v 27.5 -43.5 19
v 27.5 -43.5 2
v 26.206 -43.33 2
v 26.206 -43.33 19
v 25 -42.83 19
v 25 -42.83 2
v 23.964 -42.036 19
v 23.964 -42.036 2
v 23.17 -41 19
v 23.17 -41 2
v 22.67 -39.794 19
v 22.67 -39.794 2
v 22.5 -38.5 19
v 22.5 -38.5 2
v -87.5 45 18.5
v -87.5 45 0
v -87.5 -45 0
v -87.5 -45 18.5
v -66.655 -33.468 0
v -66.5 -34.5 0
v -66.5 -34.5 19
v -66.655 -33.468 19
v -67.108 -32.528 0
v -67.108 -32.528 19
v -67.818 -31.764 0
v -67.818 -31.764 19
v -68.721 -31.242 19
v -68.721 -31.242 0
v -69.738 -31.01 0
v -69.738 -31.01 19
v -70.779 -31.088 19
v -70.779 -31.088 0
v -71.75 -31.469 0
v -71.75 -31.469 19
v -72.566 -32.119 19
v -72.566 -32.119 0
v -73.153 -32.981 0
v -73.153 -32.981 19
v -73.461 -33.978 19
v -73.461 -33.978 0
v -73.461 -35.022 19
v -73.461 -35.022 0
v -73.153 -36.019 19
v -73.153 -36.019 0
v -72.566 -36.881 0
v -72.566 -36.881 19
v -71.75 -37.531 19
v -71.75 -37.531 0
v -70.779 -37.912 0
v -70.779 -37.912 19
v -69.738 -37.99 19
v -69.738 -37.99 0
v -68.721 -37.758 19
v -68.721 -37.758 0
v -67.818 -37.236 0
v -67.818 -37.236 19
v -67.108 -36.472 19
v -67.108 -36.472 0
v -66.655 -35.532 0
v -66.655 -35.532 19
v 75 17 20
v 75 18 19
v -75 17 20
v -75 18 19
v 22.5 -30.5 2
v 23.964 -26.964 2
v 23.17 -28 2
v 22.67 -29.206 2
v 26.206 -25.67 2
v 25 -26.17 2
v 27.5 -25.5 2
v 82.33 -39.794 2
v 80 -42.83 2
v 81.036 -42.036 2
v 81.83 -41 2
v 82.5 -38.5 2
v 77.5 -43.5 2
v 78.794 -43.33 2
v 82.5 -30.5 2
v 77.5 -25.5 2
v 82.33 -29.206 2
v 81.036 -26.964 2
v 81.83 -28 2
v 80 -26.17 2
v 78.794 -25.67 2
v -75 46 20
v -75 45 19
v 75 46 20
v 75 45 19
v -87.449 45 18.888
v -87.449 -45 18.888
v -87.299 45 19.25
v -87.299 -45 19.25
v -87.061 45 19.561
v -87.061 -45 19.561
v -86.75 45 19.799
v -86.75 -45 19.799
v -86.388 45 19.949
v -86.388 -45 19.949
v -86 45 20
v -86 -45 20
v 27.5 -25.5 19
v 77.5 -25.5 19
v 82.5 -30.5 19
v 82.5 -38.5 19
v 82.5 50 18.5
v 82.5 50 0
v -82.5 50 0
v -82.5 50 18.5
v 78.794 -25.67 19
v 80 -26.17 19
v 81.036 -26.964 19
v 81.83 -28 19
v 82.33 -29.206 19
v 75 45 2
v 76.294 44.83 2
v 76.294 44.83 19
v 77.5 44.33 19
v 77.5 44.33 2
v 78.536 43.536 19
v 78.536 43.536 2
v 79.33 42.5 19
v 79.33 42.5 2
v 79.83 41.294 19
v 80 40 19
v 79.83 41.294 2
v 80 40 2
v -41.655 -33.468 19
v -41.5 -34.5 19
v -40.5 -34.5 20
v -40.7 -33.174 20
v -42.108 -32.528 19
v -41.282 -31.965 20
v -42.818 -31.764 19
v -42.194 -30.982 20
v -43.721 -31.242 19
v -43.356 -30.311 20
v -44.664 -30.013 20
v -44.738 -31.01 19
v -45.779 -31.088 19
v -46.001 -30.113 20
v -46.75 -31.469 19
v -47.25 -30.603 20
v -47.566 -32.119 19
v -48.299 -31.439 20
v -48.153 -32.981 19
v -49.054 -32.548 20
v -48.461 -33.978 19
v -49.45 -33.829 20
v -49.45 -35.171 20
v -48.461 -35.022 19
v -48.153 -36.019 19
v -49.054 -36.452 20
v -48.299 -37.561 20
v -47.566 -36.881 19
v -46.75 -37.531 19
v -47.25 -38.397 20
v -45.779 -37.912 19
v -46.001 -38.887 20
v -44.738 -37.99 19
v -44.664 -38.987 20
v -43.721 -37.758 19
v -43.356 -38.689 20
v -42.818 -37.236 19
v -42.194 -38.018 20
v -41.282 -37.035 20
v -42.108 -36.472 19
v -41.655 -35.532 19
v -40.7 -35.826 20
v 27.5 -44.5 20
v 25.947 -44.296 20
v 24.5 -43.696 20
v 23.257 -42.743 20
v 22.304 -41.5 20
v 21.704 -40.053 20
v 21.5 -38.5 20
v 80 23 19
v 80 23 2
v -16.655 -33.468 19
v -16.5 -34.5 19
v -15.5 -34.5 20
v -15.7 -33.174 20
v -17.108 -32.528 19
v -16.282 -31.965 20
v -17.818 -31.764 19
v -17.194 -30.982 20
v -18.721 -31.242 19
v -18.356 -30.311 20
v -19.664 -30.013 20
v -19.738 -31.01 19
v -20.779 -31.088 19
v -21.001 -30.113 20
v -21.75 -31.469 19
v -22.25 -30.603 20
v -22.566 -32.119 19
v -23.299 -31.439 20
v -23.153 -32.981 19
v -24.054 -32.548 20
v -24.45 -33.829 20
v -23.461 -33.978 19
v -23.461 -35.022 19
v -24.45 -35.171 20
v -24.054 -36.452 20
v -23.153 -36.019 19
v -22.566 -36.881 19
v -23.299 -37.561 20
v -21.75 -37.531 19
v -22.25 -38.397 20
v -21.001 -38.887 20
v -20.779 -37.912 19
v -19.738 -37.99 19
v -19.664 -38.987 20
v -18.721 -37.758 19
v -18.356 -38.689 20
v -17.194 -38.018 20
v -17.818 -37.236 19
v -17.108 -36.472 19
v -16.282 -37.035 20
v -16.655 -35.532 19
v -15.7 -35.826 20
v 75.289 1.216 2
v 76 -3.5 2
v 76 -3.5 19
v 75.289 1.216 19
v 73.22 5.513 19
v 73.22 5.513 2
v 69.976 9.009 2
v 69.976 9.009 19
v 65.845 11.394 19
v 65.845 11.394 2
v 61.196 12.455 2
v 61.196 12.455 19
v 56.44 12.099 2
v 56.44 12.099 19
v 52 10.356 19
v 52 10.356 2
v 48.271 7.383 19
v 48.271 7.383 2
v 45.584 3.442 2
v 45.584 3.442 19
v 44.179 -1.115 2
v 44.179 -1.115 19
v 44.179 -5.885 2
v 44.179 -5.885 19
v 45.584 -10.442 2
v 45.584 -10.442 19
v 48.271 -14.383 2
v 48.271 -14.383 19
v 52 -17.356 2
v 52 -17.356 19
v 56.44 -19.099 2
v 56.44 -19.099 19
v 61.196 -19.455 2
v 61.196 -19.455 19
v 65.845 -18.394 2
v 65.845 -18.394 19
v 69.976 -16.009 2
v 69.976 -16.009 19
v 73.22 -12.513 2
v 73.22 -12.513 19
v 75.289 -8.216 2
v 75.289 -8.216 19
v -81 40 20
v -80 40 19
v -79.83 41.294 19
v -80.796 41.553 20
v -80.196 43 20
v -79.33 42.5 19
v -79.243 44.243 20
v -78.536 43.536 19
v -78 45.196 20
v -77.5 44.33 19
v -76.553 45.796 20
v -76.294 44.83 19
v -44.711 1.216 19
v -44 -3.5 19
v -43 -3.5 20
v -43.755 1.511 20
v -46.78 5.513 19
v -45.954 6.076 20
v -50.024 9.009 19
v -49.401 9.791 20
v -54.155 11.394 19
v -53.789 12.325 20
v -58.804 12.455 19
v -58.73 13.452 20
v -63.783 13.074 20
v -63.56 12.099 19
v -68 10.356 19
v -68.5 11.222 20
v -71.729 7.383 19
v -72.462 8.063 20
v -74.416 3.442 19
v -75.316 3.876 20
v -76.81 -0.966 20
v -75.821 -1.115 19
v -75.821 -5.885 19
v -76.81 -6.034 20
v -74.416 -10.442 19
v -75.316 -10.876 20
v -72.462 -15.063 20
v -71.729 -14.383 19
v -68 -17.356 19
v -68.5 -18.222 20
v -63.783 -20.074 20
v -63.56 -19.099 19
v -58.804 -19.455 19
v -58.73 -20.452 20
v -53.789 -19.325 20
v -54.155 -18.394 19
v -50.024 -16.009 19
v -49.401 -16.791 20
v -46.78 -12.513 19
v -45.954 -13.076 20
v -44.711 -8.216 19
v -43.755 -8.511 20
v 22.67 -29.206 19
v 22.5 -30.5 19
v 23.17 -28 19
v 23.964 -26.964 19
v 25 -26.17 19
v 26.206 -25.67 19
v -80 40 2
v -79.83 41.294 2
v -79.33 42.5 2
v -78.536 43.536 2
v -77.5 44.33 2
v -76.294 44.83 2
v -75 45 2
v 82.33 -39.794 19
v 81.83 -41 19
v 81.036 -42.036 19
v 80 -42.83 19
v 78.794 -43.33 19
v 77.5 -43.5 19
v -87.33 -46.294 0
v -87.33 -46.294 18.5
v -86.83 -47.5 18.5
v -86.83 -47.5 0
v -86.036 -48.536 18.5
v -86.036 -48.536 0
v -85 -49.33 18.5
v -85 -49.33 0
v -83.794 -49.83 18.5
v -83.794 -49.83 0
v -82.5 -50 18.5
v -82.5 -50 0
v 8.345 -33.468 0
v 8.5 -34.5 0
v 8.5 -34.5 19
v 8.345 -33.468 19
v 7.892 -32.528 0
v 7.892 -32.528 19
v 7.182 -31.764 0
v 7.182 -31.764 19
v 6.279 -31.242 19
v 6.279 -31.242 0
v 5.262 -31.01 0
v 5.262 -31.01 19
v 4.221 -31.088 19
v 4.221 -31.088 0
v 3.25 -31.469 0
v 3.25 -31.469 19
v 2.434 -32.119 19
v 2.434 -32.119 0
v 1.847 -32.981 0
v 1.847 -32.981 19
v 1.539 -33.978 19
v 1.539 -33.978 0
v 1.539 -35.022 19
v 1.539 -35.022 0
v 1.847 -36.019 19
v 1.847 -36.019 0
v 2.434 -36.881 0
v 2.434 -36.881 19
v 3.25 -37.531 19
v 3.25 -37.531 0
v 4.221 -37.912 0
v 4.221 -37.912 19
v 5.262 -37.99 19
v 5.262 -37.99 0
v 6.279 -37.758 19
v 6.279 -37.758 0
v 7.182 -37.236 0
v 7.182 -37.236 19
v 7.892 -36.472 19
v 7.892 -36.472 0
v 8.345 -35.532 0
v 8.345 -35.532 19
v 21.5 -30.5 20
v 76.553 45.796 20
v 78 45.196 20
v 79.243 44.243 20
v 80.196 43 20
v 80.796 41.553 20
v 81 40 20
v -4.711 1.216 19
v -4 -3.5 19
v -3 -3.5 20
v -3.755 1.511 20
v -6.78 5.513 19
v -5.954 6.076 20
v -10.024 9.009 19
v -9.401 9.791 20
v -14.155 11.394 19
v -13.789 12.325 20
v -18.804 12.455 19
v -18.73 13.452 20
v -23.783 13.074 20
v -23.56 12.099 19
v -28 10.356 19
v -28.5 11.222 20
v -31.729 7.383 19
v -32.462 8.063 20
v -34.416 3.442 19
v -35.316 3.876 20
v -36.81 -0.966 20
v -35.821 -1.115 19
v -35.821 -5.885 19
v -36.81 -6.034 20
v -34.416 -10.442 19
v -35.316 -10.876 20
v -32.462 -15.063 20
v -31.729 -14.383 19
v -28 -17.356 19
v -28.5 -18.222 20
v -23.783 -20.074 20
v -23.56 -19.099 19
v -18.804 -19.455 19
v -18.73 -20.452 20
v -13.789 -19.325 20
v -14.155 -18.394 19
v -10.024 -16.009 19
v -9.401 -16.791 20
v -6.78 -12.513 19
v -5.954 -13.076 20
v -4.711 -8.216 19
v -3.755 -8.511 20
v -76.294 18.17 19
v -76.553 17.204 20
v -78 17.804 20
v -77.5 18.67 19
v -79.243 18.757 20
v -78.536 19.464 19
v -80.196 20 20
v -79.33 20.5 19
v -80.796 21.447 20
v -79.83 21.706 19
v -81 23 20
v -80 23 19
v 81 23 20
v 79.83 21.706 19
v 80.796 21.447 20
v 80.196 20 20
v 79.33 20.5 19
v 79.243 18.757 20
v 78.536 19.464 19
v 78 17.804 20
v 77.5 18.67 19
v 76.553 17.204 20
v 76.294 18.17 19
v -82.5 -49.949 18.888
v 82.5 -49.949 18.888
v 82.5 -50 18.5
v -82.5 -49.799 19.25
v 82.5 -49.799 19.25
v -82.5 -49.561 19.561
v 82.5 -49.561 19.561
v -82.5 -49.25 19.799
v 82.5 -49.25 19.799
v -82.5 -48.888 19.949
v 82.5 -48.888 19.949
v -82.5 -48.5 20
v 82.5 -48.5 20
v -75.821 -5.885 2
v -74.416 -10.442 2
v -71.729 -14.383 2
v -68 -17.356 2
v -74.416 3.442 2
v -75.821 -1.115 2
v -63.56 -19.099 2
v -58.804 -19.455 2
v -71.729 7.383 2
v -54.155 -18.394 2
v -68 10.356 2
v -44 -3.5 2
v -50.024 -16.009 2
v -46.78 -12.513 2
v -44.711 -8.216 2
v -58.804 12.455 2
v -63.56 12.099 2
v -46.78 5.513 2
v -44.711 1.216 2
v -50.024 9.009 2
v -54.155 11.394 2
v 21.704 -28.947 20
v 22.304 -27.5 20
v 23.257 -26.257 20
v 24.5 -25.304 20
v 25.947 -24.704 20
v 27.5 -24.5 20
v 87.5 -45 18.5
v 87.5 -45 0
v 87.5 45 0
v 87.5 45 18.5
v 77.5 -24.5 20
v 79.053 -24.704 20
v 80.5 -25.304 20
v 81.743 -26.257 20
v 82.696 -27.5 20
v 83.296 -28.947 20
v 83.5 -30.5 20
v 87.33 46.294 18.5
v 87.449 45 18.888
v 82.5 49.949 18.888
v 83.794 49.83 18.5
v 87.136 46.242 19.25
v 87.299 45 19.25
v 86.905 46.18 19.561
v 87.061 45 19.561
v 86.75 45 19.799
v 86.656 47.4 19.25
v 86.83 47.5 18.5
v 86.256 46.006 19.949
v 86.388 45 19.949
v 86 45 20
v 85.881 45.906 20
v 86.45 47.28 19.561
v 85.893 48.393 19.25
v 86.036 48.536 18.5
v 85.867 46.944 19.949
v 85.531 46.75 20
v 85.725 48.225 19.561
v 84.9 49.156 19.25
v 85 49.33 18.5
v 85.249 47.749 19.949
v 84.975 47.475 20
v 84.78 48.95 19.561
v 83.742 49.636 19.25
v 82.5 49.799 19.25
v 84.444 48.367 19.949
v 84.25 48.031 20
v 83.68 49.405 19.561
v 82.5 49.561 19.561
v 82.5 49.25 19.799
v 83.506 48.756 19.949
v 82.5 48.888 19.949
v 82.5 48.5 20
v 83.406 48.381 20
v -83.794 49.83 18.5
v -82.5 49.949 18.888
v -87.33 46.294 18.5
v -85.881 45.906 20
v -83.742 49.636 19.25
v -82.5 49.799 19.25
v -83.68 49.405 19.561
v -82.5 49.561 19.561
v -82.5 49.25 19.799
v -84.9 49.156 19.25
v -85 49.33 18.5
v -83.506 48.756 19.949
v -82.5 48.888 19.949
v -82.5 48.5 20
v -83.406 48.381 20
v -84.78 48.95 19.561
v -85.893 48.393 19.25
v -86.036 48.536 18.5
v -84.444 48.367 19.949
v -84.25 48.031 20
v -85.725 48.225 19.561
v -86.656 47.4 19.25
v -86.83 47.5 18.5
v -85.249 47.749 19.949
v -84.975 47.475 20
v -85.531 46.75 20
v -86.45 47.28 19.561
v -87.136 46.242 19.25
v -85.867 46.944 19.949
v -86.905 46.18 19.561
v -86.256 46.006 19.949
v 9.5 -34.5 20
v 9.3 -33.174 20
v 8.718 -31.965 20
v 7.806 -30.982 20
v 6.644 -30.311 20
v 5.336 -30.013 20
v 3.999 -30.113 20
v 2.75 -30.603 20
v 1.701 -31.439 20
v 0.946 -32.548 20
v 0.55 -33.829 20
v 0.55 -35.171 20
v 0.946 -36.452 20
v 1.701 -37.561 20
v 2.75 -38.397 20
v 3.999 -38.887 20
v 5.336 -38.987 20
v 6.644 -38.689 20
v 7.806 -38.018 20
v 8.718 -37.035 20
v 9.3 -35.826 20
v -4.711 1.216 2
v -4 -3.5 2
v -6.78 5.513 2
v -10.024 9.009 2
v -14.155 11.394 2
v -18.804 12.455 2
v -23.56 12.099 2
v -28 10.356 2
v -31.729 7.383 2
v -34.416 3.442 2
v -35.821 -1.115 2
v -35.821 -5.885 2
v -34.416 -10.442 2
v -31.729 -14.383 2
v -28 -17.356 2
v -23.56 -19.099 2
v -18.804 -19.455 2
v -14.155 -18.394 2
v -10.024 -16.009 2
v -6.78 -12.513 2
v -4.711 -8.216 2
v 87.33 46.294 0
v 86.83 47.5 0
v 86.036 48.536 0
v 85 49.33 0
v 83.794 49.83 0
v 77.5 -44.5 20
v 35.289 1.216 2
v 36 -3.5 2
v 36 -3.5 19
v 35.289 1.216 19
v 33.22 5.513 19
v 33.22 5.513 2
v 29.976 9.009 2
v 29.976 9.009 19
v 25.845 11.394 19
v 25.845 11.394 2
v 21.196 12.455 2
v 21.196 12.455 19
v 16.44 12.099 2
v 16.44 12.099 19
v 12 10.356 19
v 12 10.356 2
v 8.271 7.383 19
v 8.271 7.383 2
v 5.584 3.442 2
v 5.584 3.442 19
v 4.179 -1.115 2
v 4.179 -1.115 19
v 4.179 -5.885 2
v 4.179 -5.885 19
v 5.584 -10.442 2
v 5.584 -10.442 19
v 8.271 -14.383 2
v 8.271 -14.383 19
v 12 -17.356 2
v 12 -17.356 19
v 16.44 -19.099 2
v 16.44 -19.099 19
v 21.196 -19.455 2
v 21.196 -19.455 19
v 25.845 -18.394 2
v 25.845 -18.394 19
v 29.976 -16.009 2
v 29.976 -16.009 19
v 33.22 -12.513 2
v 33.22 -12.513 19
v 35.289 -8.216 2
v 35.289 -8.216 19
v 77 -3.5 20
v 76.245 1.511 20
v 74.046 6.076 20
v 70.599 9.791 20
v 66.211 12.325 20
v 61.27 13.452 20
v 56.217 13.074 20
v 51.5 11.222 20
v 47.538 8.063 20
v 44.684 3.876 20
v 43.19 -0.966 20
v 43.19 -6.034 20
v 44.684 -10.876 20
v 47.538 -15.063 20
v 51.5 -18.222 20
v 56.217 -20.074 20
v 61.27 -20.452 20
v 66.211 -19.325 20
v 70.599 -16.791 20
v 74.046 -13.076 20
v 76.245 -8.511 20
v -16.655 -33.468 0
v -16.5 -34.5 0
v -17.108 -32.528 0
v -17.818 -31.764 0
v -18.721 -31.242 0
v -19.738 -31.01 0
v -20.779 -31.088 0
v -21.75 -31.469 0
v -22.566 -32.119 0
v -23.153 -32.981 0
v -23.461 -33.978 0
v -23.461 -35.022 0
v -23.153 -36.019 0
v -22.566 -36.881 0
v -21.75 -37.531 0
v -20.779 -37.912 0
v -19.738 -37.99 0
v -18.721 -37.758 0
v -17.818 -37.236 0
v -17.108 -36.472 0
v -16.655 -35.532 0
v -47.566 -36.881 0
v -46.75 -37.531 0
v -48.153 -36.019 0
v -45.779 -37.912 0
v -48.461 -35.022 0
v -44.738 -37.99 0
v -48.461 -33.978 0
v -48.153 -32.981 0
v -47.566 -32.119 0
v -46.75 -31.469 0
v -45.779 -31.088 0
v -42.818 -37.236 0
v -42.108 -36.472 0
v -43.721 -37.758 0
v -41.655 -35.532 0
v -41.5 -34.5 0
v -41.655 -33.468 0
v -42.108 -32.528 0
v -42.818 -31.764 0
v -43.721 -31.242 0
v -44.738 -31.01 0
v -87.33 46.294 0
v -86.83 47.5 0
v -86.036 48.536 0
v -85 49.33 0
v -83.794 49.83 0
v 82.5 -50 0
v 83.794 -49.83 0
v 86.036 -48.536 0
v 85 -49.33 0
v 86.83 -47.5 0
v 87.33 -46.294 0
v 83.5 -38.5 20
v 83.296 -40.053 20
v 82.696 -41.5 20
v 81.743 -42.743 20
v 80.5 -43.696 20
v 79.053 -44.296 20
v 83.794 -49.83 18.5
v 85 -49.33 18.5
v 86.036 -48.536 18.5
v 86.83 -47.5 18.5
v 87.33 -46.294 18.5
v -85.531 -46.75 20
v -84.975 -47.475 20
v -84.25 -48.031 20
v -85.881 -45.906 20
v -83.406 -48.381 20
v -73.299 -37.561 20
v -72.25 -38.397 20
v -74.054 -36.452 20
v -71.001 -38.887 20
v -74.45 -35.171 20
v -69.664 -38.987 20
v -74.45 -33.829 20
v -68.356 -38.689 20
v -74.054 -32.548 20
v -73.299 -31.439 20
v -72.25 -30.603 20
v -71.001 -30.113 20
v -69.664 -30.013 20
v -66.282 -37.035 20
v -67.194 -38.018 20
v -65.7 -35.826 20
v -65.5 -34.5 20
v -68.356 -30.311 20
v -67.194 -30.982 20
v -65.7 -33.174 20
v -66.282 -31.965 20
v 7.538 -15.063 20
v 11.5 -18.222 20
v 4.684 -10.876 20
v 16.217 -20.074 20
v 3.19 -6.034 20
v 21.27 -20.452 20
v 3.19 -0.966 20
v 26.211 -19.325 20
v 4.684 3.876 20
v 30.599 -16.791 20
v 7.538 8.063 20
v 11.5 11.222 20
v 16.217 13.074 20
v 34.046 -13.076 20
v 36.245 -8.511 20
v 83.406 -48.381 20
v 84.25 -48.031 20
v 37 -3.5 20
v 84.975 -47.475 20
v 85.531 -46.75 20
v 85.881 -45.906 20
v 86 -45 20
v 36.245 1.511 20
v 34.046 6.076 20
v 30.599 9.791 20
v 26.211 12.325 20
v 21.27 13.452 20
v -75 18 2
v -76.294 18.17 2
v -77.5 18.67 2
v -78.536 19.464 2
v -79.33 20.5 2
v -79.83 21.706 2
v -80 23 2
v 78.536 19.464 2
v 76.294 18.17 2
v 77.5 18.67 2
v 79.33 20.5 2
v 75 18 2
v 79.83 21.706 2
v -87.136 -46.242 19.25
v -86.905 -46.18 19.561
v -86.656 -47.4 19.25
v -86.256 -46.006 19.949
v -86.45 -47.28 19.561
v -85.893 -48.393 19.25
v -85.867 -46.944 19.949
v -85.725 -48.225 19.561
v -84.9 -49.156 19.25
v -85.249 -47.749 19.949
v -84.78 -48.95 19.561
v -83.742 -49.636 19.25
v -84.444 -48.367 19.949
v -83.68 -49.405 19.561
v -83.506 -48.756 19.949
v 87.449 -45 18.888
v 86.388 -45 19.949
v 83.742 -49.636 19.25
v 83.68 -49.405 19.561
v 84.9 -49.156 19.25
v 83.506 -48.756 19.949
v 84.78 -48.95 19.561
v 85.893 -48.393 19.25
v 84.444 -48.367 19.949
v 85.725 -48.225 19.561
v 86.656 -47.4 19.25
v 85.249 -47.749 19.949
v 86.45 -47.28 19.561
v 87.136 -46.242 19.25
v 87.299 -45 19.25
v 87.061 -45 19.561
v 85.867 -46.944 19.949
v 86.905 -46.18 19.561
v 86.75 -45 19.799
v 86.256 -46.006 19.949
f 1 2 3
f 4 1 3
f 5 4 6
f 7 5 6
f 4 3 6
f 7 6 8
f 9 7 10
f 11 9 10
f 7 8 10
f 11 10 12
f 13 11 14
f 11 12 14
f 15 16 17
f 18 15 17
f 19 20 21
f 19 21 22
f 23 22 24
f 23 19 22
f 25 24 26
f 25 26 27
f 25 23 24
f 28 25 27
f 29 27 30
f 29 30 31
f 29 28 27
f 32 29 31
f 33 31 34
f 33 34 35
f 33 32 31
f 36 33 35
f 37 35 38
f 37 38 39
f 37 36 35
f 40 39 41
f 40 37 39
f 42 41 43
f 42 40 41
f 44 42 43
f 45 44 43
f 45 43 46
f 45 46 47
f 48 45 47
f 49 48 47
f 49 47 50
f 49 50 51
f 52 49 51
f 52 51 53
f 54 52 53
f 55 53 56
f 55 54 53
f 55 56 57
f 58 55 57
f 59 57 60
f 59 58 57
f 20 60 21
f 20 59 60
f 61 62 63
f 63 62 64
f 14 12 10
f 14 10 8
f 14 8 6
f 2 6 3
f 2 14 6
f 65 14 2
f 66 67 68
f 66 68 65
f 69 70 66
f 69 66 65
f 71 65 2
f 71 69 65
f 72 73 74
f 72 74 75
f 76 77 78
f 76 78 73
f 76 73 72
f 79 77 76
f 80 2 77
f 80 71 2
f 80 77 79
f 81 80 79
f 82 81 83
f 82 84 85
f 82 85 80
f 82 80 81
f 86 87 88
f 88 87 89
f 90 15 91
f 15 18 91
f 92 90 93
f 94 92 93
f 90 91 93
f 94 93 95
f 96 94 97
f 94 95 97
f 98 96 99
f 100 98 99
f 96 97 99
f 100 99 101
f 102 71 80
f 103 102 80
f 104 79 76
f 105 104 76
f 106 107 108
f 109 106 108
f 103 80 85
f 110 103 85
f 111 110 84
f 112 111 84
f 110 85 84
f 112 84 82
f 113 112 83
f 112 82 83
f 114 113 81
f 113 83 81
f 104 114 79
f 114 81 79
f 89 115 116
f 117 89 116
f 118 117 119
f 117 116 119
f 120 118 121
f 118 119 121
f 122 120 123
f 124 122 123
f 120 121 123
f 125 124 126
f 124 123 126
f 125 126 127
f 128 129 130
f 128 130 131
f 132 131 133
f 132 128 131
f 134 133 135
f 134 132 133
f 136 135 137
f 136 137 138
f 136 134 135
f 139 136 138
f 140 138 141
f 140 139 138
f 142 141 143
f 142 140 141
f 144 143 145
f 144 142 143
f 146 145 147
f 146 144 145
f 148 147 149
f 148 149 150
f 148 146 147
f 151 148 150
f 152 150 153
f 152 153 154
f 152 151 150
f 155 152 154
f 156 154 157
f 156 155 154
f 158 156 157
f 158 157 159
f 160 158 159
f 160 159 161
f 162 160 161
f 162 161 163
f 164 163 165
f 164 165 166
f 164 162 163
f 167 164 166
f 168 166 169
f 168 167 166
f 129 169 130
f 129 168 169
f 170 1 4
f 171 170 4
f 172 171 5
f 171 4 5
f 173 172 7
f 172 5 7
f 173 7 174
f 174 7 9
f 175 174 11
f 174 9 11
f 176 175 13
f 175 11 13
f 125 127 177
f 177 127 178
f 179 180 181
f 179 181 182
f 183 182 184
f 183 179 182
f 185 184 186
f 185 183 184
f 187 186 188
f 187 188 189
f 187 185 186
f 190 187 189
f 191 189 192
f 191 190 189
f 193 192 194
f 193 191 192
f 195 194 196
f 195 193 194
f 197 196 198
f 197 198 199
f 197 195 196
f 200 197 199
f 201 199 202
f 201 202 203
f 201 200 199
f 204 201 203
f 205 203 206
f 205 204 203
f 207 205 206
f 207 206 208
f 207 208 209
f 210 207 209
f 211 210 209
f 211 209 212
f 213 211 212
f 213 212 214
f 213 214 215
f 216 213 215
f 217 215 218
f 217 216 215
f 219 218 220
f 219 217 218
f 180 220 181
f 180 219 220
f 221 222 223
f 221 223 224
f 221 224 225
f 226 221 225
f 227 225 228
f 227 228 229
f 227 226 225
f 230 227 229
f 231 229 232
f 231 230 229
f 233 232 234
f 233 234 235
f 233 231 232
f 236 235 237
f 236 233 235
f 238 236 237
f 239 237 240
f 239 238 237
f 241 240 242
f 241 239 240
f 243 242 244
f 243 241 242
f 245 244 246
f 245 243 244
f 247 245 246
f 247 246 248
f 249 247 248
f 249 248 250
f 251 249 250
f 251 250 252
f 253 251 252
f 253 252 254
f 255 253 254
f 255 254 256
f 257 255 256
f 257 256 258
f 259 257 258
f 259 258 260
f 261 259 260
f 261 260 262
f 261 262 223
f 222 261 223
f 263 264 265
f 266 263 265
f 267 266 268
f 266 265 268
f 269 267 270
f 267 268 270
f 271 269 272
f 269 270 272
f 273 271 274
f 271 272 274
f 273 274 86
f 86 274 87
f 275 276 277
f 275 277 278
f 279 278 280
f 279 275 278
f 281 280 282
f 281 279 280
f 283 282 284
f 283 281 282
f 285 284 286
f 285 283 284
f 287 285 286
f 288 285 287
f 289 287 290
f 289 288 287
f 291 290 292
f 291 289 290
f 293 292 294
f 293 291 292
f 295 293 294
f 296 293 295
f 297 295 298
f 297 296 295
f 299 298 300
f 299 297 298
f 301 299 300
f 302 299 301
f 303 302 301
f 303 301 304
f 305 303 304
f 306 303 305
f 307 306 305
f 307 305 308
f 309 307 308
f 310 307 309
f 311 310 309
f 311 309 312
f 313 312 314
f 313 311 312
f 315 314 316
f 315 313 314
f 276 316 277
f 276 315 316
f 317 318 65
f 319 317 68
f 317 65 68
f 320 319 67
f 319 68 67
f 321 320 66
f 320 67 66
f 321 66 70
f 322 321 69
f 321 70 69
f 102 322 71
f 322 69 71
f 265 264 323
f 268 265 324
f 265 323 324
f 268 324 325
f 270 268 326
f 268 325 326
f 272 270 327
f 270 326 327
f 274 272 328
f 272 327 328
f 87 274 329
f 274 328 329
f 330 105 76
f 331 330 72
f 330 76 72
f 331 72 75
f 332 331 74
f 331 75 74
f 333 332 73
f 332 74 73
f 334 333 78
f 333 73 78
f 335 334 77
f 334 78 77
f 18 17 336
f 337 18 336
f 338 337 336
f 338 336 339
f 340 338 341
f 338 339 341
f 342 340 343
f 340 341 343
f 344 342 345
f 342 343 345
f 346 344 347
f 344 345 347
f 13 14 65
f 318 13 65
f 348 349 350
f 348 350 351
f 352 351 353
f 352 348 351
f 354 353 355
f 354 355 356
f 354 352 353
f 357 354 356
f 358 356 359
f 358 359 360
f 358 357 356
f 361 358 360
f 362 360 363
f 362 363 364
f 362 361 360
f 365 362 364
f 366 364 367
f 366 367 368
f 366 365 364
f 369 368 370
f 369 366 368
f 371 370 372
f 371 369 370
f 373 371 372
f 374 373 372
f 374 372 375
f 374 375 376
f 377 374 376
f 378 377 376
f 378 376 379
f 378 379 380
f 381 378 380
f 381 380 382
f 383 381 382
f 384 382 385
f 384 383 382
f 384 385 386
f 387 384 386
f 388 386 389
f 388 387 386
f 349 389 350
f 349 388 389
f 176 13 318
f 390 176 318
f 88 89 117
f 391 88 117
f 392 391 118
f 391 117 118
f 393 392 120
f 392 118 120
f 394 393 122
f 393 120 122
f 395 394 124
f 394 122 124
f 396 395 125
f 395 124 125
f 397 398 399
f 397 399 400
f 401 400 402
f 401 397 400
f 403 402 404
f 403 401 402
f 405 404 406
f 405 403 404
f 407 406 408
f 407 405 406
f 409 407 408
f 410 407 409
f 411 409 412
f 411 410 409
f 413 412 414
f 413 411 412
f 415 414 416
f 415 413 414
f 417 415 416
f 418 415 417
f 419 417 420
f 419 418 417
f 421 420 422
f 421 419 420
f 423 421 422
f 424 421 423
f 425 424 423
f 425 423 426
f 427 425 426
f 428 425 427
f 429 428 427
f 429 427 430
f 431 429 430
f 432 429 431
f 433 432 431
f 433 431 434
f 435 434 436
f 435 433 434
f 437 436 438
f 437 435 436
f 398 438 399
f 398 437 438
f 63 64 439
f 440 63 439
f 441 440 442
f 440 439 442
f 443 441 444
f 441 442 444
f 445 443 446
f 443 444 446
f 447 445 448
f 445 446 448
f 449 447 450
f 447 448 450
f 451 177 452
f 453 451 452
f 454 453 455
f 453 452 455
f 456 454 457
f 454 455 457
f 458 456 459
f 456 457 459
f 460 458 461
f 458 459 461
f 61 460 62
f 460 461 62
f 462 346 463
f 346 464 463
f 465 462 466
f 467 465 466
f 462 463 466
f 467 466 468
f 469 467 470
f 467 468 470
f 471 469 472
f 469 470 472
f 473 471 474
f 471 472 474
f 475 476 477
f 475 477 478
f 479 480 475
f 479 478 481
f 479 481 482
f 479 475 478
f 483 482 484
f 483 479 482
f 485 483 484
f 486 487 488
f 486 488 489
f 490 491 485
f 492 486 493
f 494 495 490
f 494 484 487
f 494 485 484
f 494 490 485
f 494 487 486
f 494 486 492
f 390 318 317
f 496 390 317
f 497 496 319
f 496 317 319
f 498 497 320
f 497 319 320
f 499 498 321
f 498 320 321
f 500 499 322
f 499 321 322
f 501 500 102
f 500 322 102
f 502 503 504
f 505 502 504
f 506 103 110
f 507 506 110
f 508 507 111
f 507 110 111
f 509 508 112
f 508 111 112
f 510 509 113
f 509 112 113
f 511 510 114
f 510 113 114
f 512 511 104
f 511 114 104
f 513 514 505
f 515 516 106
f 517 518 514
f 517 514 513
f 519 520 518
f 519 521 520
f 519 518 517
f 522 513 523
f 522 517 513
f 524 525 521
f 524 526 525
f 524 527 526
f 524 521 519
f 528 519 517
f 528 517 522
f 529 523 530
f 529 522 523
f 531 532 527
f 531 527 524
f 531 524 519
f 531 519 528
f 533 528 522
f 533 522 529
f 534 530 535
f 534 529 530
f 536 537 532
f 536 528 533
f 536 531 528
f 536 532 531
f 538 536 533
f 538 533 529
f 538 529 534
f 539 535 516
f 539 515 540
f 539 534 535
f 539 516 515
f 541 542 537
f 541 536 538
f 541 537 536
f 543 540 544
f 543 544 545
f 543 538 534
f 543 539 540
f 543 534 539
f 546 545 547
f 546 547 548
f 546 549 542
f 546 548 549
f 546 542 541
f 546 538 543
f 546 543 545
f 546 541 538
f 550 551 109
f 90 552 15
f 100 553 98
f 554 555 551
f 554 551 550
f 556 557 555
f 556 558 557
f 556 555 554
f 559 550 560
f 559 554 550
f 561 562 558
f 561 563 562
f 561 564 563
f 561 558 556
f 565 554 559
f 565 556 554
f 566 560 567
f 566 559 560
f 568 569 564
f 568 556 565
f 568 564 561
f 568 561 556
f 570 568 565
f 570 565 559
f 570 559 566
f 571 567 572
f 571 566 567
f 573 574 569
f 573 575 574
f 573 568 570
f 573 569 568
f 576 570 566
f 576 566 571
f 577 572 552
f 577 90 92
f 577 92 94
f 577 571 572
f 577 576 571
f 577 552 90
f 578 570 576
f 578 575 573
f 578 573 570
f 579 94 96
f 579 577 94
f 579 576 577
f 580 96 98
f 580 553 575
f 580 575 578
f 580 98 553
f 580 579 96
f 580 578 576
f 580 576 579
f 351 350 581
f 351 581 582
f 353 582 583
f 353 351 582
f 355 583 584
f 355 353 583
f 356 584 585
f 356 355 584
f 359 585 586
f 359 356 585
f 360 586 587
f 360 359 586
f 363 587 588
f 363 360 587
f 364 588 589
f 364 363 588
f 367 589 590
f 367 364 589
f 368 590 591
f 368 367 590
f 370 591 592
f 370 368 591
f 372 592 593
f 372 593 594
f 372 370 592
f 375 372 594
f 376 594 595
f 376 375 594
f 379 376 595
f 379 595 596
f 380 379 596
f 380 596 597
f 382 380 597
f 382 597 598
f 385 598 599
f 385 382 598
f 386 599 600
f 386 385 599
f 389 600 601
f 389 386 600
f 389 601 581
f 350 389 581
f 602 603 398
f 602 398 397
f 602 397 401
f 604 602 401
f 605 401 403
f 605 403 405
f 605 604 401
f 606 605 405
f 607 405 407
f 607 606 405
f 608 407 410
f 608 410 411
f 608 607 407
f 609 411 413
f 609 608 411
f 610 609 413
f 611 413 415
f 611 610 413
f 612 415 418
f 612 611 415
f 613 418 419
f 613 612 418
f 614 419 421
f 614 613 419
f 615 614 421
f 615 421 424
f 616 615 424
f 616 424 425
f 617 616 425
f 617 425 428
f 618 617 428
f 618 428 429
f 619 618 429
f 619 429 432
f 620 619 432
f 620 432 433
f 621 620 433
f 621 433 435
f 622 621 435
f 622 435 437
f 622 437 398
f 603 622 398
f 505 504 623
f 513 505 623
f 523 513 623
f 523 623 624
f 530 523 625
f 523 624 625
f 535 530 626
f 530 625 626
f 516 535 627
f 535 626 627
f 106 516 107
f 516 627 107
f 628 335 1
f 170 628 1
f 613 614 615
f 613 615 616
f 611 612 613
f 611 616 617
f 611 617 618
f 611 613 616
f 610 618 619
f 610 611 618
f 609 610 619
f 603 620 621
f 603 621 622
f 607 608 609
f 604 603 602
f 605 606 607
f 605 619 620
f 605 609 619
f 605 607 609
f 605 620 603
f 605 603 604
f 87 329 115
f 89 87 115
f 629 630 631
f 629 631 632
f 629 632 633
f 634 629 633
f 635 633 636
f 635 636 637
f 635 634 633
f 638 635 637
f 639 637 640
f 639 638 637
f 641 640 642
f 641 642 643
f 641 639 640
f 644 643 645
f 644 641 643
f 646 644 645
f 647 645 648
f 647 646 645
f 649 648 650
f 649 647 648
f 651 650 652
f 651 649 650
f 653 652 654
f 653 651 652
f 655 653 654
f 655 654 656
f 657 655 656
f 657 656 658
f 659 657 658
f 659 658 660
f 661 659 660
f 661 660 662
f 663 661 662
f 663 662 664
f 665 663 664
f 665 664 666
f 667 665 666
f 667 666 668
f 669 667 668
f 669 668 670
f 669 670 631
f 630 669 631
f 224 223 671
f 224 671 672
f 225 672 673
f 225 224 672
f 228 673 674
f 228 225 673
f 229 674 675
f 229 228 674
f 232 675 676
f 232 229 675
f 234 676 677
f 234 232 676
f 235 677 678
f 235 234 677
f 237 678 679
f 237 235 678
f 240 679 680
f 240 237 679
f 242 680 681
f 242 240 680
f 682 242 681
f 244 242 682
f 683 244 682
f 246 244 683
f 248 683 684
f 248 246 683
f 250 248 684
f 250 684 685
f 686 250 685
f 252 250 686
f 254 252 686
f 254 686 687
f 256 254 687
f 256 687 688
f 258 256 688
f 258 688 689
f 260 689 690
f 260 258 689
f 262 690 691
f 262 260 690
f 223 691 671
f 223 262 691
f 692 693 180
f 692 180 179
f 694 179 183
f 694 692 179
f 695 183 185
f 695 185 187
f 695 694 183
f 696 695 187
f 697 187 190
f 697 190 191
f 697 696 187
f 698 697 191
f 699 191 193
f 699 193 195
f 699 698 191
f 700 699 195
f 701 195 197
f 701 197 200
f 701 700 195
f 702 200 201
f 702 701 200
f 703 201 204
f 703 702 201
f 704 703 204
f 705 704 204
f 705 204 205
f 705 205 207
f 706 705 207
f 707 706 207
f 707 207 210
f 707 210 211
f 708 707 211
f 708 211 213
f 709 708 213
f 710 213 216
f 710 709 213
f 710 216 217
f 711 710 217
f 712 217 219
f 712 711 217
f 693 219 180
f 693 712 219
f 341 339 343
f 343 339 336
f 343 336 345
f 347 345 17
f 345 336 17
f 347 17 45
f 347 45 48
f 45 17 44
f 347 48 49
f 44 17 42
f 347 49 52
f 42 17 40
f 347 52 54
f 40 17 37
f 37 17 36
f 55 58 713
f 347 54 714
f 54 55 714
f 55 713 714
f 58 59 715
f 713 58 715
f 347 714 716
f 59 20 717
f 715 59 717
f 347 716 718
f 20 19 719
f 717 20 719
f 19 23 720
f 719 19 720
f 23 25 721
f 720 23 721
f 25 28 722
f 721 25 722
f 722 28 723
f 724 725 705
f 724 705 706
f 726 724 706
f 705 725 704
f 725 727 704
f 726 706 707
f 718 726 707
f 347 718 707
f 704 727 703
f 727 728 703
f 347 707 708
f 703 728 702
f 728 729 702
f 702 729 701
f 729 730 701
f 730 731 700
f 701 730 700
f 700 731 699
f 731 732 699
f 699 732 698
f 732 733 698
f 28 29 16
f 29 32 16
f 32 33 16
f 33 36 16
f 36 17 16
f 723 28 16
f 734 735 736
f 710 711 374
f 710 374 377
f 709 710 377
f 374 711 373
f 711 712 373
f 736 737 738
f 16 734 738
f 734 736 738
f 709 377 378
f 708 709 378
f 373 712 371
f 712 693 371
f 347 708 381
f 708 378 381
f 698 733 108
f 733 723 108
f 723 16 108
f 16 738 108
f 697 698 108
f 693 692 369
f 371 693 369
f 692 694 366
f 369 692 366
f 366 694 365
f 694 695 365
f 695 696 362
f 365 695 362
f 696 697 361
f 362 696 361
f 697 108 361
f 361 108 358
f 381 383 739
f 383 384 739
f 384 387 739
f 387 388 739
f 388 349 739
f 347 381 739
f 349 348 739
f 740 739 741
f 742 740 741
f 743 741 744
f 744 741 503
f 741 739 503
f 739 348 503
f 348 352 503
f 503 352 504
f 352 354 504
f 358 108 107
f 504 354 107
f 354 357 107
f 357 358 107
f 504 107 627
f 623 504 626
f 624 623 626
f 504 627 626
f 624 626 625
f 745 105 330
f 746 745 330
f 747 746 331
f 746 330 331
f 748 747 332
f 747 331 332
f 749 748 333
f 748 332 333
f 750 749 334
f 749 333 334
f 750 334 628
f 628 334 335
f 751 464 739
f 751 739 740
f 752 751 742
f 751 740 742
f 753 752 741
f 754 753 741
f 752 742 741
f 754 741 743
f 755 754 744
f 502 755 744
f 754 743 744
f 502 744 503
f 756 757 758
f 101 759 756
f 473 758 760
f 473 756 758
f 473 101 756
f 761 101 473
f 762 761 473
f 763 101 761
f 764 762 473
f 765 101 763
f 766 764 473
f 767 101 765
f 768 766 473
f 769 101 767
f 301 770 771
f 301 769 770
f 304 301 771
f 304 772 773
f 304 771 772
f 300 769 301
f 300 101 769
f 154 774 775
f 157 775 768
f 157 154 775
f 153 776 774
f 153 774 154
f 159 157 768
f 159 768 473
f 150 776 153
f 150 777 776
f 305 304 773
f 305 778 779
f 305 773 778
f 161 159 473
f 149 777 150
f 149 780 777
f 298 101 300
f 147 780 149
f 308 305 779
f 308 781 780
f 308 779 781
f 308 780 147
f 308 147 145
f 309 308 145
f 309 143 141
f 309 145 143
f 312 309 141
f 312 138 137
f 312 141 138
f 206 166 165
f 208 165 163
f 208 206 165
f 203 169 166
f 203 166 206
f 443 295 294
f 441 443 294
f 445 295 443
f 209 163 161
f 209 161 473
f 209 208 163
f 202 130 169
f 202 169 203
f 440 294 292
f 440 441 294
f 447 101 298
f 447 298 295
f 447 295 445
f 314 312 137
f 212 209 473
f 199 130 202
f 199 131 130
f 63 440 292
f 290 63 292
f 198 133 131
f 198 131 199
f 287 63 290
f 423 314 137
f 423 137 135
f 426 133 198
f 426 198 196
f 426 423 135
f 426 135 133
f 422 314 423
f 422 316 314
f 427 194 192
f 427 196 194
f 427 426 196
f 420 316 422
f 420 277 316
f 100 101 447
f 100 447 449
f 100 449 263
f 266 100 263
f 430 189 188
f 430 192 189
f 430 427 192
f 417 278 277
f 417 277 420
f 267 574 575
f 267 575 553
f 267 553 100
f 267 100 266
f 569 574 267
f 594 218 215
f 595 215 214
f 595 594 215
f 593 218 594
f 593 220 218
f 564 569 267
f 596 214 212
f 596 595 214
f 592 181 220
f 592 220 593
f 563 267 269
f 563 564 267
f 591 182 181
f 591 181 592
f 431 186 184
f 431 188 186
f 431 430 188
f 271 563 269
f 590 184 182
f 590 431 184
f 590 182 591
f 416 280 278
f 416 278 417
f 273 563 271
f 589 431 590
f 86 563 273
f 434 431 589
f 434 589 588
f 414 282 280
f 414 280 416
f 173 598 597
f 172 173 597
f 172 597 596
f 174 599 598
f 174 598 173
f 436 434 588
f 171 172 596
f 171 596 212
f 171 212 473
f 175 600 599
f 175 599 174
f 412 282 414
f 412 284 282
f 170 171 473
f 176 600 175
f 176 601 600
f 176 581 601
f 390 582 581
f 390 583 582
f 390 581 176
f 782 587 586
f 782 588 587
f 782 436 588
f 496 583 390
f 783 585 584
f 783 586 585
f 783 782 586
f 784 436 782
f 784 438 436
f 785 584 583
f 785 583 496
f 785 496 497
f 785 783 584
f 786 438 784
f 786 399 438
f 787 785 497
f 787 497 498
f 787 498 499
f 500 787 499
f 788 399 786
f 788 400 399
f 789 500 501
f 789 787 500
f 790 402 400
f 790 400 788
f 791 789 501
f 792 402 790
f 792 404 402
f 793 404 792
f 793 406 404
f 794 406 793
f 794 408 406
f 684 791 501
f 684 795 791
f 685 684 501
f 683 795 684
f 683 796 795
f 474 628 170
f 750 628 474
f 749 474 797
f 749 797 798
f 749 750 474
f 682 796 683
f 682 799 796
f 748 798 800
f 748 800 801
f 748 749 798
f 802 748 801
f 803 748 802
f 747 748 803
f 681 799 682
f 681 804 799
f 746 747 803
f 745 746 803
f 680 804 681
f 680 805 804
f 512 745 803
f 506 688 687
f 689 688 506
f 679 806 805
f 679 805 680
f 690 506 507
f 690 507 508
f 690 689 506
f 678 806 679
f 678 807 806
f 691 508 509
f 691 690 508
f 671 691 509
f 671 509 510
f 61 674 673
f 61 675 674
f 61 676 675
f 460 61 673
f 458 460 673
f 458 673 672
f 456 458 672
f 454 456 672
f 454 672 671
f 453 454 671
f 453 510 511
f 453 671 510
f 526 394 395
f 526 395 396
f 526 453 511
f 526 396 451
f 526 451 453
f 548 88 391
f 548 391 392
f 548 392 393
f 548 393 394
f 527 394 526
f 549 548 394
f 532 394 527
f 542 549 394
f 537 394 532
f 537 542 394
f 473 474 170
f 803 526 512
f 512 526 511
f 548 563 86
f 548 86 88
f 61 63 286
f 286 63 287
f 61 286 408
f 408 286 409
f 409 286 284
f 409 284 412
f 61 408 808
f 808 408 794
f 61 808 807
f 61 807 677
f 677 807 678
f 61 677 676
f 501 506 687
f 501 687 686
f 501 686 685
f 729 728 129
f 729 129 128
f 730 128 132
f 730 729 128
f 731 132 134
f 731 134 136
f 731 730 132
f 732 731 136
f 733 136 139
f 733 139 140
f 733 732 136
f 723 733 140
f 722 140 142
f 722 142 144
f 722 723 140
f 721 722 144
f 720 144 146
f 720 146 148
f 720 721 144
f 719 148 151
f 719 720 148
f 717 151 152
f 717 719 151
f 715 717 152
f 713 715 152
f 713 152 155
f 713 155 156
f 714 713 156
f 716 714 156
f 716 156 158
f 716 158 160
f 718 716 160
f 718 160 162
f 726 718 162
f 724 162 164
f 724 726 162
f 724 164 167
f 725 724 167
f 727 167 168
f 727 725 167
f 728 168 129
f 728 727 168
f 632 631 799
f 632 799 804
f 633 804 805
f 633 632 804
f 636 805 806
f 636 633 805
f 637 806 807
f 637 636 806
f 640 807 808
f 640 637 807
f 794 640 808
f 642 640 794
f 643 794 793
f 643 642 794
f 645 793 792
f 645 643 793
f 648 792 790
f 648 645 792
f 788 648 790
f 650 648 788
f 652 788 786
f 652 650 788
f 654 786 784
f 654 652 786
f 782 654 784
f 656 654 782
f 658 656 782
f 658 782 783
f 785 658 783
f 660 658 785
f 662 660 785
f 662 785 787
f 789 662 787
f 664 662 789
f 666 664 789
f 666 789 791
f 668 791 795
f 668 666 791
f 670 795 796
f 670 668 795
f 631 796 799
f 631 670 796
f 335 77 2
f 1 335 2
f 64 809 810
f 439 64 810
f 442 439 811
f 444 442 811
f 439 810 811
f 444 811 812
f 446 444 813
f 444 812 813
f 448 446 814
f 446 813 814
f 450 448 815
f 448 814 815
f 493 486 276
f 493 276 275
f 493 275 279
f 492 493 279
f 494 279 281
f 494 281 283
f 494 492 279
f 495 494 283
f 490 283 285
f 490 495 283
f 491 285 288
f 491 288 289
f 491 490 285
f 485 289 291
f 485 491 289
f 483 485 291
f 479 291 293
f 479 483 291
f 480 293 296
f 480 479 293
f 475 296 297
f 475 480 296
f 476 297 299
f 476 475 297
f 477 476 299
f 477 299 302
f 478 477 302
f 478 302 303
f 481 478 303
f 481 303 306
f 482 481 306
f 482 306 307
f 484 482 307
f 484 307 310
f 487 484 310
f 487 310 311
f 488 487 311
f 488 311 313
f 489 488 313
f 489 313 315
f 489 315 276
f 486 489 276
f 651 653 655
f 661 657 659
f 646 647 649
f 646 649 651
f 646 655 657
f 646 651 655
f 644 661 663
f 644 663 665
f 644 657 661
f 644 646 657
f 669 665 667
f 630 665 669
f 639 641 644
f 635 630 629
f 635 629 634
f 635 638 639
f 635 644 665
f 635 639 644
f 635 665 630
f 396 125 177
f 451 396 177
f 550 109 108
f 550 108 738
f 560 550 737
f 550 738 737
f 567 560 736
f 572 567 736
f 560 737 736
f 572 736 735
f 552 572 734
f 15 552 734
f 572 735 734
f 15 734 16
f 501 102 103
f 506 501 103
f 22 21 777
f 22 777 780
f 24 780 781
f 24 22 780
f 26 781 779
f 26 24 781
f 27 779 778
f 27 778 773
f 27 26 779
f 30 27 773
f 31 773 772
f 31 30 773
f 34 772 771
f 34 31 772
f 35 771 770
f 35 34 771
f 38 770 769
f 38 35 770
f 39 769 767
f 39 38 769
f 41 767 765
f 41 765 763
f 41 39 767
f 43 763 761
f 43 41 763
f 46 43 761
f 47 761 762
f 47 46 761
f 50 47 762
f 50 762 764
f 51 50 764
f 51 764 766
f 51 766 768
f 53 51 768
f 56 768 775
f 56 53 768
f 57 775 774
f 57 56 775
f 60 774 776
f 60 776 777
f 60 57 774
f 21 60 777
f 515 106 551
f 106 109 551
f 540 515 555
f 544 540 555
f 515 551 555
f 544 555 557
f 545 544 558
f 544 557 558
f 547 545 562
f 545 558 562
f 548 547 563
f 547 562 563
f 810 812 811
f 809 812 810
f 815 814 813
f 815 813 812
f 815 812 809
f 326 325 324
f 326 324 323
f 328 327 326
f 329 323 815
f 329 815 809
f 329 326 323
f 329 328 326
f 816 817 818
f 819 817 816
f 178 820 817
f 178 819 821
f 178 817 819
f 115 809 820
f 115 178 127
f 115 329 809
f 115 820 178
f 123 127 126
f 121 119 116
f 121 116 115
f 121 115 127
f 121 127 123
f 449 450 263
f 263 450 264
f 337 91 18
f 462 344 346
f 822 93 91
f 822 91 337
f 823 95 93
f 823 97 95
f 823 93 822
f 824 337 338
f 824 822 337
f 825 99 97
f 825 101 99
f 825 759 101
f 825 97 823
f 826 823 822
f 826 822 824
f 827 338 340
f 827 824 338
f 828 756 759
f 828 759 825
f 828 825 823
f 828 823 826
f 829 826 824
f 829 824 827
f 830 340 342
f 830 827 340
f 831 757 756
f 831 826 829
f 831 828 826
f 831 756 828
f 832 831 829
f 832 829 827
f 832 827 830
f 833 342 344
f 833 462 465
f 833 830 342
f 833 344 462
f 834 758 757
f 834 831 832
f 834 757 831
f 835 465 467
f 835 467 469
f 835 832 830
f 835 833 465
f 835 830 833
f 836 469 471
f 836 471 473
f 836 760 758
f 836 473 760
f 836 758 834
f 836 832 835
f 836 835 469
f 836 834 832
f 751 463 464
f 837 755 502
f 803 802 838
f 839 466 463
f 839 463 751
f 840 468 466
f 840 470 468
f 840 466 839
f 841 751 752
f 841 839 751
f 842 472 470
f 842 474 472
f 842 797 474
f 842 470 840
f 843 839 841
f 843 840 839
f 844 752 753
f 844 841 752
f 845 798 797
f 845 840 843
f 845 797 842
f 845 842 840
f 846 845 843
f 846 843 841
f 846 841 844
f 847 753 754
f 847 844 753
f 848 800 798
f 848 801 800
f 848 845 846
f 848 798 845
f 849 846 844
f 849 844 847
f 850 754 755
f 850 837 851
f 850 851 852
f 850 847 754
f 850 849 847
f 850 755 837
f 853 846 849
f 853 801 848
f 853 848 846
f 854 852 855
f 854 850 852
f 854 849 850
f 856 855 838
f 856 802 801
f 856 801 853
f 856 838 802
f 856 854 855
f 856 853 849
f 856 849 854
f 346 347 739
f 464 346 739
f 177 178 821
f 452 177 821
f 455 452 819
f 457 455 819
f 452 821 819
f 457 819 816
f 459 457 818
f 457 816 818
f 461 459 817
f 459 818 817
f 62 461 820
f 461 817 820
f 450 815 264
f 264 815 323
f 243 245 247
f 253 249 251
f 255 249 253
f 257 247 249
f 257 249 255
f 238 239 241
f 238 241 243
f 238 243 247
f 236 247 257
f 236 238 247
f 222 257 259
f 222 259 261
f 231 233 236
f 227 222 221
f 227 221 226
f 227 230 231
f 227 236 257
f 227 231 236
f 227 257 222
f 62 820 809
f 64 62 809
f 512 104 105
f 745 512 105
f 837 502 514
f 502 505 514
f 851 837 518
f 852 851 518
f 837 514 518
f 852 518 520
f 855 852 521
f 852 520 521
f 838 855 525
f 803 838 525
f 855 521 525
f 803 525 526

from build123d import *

# Parameters (mm, degrees)
F0_R     = 12.5
F0_R_2   = 18
F0_R_3   = 16
F0_R_4   = 8.5
F0_R_5   = 3.5
F1_DEPTH = 20
F2_DEPTH = 2
F3_R     = 1.5
F4_SIZE  = 1
F5_SIZE  = 1


# Not quite as in the source:
# - a feature names something its author has since deleted; it is built from what else it names


with BuildPart() as f1:
    # F0 (on Top) → F1 (new body)
    with BuildSketch(Plane.XY):
        with BuildLine():
            Line((82.5, 50), (-82.5, 50))
            ThreePointArc((-82.5, 50), (-86.0355339059, 48.5355339059), (-87.5, 45))
            Line((-87.5, 45), (-87.5, -45))
            ThreePointArc((-87.5, -45), (-86.0355339059, -48.5355339059), (-82.5, -50))
            Line((-82.5, -50), (82.5, -50))
            ThreePointArc((82.5, -50), (86.0355339059, -48.5355339059), (87.5, -45))
            Line((87.5, -45), (87.5, 45))
            ThreePointArc((87.5, 45), (86.0355339059, 48.5355339059), (82.5, 50))
        make_face()
        with Locations((-70, -34.5)):
            Circle(F0_R, mode=Mode.SUBTRACT)
        with BuildLine():
            ThreePointArc((-32.5, -34.5), (-45, -47), (-57.5, -34.5))
            ThreePointArc((-57.5, -34.5), (-45, -22), (-32.5, -34.5))
        make_face(mode=Mode.SUBTRACT)
        with BuildLine():
            ThreePointArc((-7.5, -34.5), (-20, -47), (-32.5, -34.5))
            ThreePointArc((-32.5, -34.5), (-20, -22), (-7.5, -34.5))
        make_face(mode=Mode.SUBTRACT)
        with Locations((-60, -3.5)):
            Circle(F0_R_2, mode=Mode.SUBTRACT)
        with Locations((-20, -3.5)):
            Circle(F0_R_2, mode=Mode.SUBTRACT)
        with BuildLine():
            ThreePointArc((17.5, -34.5), (5, -47), (-7.5, -34.5))
            ThreePointArc((-7.5, -34.5), (5, -22), (17.5, -34.5))
        make_face(mode=Mode.SUBTRACT)
        with BuildLine():
            ThreePointArc((20.5, -30.5), (22.5502525317, -25.5502525317), (27.5, -23.5))
            Line((27.5, -23.5), (77.5, -23.5))
            ThreePointArc((77.5, -23.5), (82.4497474683, -25.5502525317), (84.5, -30.5))
            Line((84.5, -30.5), (84.5, -38.5))
            ThreePointArc((84.5, -38.5), (82.4497474683, -43.4497474683), (77.5, -45.5))
            Line((77.5, -45.5), (27.5, -45.5))
            ThreePointArc((27.5, -45.5), (22.5502525317, -43.4497474683), (20.5, -38.5))
            Line((20.5, -38.5), (20.5, -30.5))
        make_face(mode=Mode.SUBTRACT)
        with Locations((20, -3.5)):
            Circle(F0_R_2, mode=Mode.SUBTRACT)
        with Locations((60, -3.5)):
            Circle(F0_R_2, mode=Mode.SUBTRACT)
        with BuildLine():
            ThreePointArc((82, 23), (79.9497474683, 18.0502525317), (75, 16))
            Line((75, 16), (-75, 16))
            ThreePointArc((-75, 16), (-79.9497474683, 18.0502525317), (-82, 23))
            Line((-82, 23), (-82, 40))
            ThreePointArc((-82, 40), (-79.9497474683, 44.9497474683), (-75, 47))
            Line((-75, 47), (75, 47))
            ThreePointArc((75, 47), (79.9497474683, 44.9497474683), (82, 40))
            Line((82, 40), (82, 23))
        make_face(mode=Mode.SUBTRACT)
        with BuildLine():
            Line((-75, 16), (75, 16))
            ThreePointArc((75, 16), (79.9497474683, 18.0502525317), (82, 23))
            Line((82, 23), (82, 40))
            ThreePointArc((82, 40), (79.9497474683, 44.9497474683), (75, 47))
            Line((75, 47), (-75, 47))
            ThreePointArc((-75, 47), (-79.9497474683, 44.9497474683), (-82, 40))
            Line((-82, 40), (-82, 23))
            ThreePointArc((-82, 23), (-79.9497474683, 18.0502525317), (-75, 16))
        make_face()
        with BuildLine():
            ThreePointArc((80, 23), (78.5355339059, 19.4644660941), (75, 18))
            Line((75, 18), (-75, 18))
            ThreePointArc((-75, 18), (-78.5355339059, 19.4644660941), (-80, 23))
            Line((-80, 23), (-80, 40))
            ThreePointArc((-80, 40), (-78.5355339059, 43.5355339059), (-75, 45))
            Line((-75, 45), (75, 45))
            ThreePointArc((75, 45), (78.5355339059, 43.5355339059), (80, 40))
            Line((80, 40), (80, 23))
        make_face(mode=Mode.SUBTRACT)
        with Locations((60, -3.5)):
            Circle(F0_R_2)
        with Locations((60, -3.5)):
            Circle(F0_R_3, mode=Mode.SUBTRACT)
        with Locations((20, -3.5)):
            Circle(F0_R_2)
        with Locations((20, -3.5)):
            Circle(F0_R_3, mode=Mode.SUBTRACT)
        with Locations((-20, -3.5)):
            Circle(F0_R_2)
        with Locations((-20, -3.5)):
            Circle(F0_R_3, mode=Mode.SUBTRACT)
        with Locations((-60, -3.5)):
            Circle(F0_R_2)
        with Locations((-60, -3.5)):
            Circle(F0_R_3, mode=Mode.SUBTRACT)
        with Locations((-70, -34.5)):
            Circle(F0_R)
        with Locations((-70, -34.5)):
            Circle(F0_R_4, mode=Mode.SUBTRACT)
        with Locations((-70, -34.5)):
            Circle(F0_R_4)
        with Locations((-70, -34.5)):
            Circle(F0_R_5, mode=Mode.SUBTRACT)
        with BuildLine():
            ThreePointArc((-32.5, -34.5), (-45, -22), (-57.5, -34.5))
            ThreePointArc((-57.5, -34.5), (-45, -47), (-32.5, -34.5))
        make_face()
        with Locations((-45, -34.5)):
            Circle(F0_R_4, mode=Mode.SUBTRACT)
        with Locations((-45, -34.5)):
            Circle(F0_R_4)
        with Locations((-45, -34.5)):
            Circle(F0_R_5, mode=Mode.SUBTRACT)
        with BuildLine():
            ThreePointArc((-7.5, -34.5), (-20, -22), (-32.5, -34.5))
            ThreePointArc((-32.5, -34.5), (-20, -47), (-7.5, -34.5))
        make_face()
        with Locations((-20, -34.5)):
            Circle(F0_R_4, mode=Mode.SUBTRACT)
        with Locations((-20, -34.5)):
            Circle(F0_R_4)
        with Locations((-20, -34.5)):
            Circle(F0_R_5, mode=Mode.SUBTRACT)
        with BuildLine():
            ThreePointArc((17.5, -34.5), (5, -22), (-7.5, -34.5))
            ThreePointArc((-7.5, -34.5), (5, -47), (17.5, -34.5))
        make_face()
        with Locations((5, -34.5)):
            Circle(F0_R_4, mode=Mode.SUBTRACT)
        with Locations((5, -34.5)):
            Circle(F0_R_4)
        with Locations((5, -34.5)):
            Circle(F0_R_5, mode=Mode.SUBTRACT)
        with BuildLine():
            Line((77.5, -23.5), (27.5, -23.5))
            ThreePointArc((27.5, -23.5), (22.5502525317, -25.5502525317), (20.5, -30.5))
            Line((20.5, -30.5), (20.5, -38.5))
            ThreePointArc((20.5, -38.5), (22.5502525317, -43.4497474683), (27.5, -45.5))
            Line((27.5, -45.5), (77.5, -45.5))
            ThreePointArc((77.5, -45.5), (82.4497474683, -43.4497474683), (84.5, -38.5))
            Line((84.5, -38.5), (84.5, -30.5))
            ThreePointArc((84.5, -30.5), (82.4497474683, -25.5502525317), (77.5, -23.5))
        make_face()
        with BuildLine():
            Line((27.5, -25.5), (77.5, -25.5))
            ThreePointArc((77.5, -25.5), (81.0355339059, -26.9644660941), (82.5, -30.5))
            Line((82.5, -30.5), (82.5, -38.5))
            ThreePointArc((82.5, -38.5), (81.0355339059, -42.0355339059), (77.5, -43.5))
            Line((77.5, -43.5), (27.5, -43.5))
            ThreePointArc((27.5, -43.5), (23.9644660941, -42.0355339059), (22.5, -38.5))
            Line((22.5, -38.5), (22.5, -30.5))
            ThreePointArc((22.5, -30.5), (23.9644660941, -26.9644660941), (27.5, -25.5))
        make_face(mode=Mode.SUBTRACT)
    extrude(amount=F1_DEPTH)

    # F0 (on Top) → F2 (join)
    with BuildSketch(Plane.XY):
        with Locations((-60, -3.5)):
            Circle(F0_R_3)
        with Locations((-20, -3.5)):
            Circle(F0_R_3)
        with Locations((60, -3.5)):
            Circle(F0_R_3)
        with BuildLine():
            Line((-75, 18), (75, 18))
            ThreePointArc((75, 18), (78.5355339059, 19.4644660941), (80, 23))
            Line((80, 23), (80, 40))
            ThreePointArc((80, 40), (78.5355339059, 43.5355339059), (75, 45))
            Line((75, 45), (-75, 45))
            ThreePointArc((-75, 45), (-78.5355339059, 43.5355339059), (-80, 40))
            Line((-80, 40), (-80, 23))
            ThreePointArc((-80, 23), (-78.5355339059, 19.4644660941), (-75, 18))
        make_face()
        with BuildLine():
            ThreePointArc((82.5, -30.5), (81.0355339059, -26.9644660941), (77.5, -25.5))
            Line((77.5, -25.5), (27.5, -25.5))
            ThreePointArc((27.5, -25.5), (23.9644660941, -26.9644660941), (22.5, -30.5))
            Line((22.5, -30.5), (22.5, -38.5))
            ThreePointArc((22.5, -38.5), (23.9644660941, -42.0355339059), (27.5, -43.5))
            Line((27.5, -43.5), (77.5, -43.5))
            ThreePointArc((77.5, -43.5), (81.0355339059, -42.0355339059), (82.5, -38.5))
            Line((82.5, -38.5), (82.5, -30.5))
        make_face()
        with Locations((20, -3.5)):
            Circle(F0_R_3)
    extrude(amount=F2_DEPTH)

    # F3
    f3_edges = [f1.edges().sort_by_distance(p)[0] for p in [
        (0, -50, 20),
    ]]
    fillet(f3_edges, radius=F3_R)

    # F4
    f4_edges = [f1.edges().sort_by_distance(p)[0] for p in [
        (-76, -3.5, 20),
        (-36, -3.5, 20),
        (44, -3.5, 20),
        (-78.535534, 43.535534, 20),
        (-80, 31.5, 20),
        (22.5, -30.5, 11),
        (23.964466, -26.964466, 20),
        (4, -3.5, 20),
    ]]
    chamfer(f4_edges, length=F4_SIZE)

    # F5
    f5_edges = [f1.edges().sort_by_distance(p)[0] for p in [
        (-73.5, -34.5, 20),
        (-48.5, -34.5, 20),
        (-23.5, -34.5, 20),
        (1.5, -34.5, 20),
    ]]
    chamfer(f5_edges, length=F5_SIZE)


solid = f1.part
